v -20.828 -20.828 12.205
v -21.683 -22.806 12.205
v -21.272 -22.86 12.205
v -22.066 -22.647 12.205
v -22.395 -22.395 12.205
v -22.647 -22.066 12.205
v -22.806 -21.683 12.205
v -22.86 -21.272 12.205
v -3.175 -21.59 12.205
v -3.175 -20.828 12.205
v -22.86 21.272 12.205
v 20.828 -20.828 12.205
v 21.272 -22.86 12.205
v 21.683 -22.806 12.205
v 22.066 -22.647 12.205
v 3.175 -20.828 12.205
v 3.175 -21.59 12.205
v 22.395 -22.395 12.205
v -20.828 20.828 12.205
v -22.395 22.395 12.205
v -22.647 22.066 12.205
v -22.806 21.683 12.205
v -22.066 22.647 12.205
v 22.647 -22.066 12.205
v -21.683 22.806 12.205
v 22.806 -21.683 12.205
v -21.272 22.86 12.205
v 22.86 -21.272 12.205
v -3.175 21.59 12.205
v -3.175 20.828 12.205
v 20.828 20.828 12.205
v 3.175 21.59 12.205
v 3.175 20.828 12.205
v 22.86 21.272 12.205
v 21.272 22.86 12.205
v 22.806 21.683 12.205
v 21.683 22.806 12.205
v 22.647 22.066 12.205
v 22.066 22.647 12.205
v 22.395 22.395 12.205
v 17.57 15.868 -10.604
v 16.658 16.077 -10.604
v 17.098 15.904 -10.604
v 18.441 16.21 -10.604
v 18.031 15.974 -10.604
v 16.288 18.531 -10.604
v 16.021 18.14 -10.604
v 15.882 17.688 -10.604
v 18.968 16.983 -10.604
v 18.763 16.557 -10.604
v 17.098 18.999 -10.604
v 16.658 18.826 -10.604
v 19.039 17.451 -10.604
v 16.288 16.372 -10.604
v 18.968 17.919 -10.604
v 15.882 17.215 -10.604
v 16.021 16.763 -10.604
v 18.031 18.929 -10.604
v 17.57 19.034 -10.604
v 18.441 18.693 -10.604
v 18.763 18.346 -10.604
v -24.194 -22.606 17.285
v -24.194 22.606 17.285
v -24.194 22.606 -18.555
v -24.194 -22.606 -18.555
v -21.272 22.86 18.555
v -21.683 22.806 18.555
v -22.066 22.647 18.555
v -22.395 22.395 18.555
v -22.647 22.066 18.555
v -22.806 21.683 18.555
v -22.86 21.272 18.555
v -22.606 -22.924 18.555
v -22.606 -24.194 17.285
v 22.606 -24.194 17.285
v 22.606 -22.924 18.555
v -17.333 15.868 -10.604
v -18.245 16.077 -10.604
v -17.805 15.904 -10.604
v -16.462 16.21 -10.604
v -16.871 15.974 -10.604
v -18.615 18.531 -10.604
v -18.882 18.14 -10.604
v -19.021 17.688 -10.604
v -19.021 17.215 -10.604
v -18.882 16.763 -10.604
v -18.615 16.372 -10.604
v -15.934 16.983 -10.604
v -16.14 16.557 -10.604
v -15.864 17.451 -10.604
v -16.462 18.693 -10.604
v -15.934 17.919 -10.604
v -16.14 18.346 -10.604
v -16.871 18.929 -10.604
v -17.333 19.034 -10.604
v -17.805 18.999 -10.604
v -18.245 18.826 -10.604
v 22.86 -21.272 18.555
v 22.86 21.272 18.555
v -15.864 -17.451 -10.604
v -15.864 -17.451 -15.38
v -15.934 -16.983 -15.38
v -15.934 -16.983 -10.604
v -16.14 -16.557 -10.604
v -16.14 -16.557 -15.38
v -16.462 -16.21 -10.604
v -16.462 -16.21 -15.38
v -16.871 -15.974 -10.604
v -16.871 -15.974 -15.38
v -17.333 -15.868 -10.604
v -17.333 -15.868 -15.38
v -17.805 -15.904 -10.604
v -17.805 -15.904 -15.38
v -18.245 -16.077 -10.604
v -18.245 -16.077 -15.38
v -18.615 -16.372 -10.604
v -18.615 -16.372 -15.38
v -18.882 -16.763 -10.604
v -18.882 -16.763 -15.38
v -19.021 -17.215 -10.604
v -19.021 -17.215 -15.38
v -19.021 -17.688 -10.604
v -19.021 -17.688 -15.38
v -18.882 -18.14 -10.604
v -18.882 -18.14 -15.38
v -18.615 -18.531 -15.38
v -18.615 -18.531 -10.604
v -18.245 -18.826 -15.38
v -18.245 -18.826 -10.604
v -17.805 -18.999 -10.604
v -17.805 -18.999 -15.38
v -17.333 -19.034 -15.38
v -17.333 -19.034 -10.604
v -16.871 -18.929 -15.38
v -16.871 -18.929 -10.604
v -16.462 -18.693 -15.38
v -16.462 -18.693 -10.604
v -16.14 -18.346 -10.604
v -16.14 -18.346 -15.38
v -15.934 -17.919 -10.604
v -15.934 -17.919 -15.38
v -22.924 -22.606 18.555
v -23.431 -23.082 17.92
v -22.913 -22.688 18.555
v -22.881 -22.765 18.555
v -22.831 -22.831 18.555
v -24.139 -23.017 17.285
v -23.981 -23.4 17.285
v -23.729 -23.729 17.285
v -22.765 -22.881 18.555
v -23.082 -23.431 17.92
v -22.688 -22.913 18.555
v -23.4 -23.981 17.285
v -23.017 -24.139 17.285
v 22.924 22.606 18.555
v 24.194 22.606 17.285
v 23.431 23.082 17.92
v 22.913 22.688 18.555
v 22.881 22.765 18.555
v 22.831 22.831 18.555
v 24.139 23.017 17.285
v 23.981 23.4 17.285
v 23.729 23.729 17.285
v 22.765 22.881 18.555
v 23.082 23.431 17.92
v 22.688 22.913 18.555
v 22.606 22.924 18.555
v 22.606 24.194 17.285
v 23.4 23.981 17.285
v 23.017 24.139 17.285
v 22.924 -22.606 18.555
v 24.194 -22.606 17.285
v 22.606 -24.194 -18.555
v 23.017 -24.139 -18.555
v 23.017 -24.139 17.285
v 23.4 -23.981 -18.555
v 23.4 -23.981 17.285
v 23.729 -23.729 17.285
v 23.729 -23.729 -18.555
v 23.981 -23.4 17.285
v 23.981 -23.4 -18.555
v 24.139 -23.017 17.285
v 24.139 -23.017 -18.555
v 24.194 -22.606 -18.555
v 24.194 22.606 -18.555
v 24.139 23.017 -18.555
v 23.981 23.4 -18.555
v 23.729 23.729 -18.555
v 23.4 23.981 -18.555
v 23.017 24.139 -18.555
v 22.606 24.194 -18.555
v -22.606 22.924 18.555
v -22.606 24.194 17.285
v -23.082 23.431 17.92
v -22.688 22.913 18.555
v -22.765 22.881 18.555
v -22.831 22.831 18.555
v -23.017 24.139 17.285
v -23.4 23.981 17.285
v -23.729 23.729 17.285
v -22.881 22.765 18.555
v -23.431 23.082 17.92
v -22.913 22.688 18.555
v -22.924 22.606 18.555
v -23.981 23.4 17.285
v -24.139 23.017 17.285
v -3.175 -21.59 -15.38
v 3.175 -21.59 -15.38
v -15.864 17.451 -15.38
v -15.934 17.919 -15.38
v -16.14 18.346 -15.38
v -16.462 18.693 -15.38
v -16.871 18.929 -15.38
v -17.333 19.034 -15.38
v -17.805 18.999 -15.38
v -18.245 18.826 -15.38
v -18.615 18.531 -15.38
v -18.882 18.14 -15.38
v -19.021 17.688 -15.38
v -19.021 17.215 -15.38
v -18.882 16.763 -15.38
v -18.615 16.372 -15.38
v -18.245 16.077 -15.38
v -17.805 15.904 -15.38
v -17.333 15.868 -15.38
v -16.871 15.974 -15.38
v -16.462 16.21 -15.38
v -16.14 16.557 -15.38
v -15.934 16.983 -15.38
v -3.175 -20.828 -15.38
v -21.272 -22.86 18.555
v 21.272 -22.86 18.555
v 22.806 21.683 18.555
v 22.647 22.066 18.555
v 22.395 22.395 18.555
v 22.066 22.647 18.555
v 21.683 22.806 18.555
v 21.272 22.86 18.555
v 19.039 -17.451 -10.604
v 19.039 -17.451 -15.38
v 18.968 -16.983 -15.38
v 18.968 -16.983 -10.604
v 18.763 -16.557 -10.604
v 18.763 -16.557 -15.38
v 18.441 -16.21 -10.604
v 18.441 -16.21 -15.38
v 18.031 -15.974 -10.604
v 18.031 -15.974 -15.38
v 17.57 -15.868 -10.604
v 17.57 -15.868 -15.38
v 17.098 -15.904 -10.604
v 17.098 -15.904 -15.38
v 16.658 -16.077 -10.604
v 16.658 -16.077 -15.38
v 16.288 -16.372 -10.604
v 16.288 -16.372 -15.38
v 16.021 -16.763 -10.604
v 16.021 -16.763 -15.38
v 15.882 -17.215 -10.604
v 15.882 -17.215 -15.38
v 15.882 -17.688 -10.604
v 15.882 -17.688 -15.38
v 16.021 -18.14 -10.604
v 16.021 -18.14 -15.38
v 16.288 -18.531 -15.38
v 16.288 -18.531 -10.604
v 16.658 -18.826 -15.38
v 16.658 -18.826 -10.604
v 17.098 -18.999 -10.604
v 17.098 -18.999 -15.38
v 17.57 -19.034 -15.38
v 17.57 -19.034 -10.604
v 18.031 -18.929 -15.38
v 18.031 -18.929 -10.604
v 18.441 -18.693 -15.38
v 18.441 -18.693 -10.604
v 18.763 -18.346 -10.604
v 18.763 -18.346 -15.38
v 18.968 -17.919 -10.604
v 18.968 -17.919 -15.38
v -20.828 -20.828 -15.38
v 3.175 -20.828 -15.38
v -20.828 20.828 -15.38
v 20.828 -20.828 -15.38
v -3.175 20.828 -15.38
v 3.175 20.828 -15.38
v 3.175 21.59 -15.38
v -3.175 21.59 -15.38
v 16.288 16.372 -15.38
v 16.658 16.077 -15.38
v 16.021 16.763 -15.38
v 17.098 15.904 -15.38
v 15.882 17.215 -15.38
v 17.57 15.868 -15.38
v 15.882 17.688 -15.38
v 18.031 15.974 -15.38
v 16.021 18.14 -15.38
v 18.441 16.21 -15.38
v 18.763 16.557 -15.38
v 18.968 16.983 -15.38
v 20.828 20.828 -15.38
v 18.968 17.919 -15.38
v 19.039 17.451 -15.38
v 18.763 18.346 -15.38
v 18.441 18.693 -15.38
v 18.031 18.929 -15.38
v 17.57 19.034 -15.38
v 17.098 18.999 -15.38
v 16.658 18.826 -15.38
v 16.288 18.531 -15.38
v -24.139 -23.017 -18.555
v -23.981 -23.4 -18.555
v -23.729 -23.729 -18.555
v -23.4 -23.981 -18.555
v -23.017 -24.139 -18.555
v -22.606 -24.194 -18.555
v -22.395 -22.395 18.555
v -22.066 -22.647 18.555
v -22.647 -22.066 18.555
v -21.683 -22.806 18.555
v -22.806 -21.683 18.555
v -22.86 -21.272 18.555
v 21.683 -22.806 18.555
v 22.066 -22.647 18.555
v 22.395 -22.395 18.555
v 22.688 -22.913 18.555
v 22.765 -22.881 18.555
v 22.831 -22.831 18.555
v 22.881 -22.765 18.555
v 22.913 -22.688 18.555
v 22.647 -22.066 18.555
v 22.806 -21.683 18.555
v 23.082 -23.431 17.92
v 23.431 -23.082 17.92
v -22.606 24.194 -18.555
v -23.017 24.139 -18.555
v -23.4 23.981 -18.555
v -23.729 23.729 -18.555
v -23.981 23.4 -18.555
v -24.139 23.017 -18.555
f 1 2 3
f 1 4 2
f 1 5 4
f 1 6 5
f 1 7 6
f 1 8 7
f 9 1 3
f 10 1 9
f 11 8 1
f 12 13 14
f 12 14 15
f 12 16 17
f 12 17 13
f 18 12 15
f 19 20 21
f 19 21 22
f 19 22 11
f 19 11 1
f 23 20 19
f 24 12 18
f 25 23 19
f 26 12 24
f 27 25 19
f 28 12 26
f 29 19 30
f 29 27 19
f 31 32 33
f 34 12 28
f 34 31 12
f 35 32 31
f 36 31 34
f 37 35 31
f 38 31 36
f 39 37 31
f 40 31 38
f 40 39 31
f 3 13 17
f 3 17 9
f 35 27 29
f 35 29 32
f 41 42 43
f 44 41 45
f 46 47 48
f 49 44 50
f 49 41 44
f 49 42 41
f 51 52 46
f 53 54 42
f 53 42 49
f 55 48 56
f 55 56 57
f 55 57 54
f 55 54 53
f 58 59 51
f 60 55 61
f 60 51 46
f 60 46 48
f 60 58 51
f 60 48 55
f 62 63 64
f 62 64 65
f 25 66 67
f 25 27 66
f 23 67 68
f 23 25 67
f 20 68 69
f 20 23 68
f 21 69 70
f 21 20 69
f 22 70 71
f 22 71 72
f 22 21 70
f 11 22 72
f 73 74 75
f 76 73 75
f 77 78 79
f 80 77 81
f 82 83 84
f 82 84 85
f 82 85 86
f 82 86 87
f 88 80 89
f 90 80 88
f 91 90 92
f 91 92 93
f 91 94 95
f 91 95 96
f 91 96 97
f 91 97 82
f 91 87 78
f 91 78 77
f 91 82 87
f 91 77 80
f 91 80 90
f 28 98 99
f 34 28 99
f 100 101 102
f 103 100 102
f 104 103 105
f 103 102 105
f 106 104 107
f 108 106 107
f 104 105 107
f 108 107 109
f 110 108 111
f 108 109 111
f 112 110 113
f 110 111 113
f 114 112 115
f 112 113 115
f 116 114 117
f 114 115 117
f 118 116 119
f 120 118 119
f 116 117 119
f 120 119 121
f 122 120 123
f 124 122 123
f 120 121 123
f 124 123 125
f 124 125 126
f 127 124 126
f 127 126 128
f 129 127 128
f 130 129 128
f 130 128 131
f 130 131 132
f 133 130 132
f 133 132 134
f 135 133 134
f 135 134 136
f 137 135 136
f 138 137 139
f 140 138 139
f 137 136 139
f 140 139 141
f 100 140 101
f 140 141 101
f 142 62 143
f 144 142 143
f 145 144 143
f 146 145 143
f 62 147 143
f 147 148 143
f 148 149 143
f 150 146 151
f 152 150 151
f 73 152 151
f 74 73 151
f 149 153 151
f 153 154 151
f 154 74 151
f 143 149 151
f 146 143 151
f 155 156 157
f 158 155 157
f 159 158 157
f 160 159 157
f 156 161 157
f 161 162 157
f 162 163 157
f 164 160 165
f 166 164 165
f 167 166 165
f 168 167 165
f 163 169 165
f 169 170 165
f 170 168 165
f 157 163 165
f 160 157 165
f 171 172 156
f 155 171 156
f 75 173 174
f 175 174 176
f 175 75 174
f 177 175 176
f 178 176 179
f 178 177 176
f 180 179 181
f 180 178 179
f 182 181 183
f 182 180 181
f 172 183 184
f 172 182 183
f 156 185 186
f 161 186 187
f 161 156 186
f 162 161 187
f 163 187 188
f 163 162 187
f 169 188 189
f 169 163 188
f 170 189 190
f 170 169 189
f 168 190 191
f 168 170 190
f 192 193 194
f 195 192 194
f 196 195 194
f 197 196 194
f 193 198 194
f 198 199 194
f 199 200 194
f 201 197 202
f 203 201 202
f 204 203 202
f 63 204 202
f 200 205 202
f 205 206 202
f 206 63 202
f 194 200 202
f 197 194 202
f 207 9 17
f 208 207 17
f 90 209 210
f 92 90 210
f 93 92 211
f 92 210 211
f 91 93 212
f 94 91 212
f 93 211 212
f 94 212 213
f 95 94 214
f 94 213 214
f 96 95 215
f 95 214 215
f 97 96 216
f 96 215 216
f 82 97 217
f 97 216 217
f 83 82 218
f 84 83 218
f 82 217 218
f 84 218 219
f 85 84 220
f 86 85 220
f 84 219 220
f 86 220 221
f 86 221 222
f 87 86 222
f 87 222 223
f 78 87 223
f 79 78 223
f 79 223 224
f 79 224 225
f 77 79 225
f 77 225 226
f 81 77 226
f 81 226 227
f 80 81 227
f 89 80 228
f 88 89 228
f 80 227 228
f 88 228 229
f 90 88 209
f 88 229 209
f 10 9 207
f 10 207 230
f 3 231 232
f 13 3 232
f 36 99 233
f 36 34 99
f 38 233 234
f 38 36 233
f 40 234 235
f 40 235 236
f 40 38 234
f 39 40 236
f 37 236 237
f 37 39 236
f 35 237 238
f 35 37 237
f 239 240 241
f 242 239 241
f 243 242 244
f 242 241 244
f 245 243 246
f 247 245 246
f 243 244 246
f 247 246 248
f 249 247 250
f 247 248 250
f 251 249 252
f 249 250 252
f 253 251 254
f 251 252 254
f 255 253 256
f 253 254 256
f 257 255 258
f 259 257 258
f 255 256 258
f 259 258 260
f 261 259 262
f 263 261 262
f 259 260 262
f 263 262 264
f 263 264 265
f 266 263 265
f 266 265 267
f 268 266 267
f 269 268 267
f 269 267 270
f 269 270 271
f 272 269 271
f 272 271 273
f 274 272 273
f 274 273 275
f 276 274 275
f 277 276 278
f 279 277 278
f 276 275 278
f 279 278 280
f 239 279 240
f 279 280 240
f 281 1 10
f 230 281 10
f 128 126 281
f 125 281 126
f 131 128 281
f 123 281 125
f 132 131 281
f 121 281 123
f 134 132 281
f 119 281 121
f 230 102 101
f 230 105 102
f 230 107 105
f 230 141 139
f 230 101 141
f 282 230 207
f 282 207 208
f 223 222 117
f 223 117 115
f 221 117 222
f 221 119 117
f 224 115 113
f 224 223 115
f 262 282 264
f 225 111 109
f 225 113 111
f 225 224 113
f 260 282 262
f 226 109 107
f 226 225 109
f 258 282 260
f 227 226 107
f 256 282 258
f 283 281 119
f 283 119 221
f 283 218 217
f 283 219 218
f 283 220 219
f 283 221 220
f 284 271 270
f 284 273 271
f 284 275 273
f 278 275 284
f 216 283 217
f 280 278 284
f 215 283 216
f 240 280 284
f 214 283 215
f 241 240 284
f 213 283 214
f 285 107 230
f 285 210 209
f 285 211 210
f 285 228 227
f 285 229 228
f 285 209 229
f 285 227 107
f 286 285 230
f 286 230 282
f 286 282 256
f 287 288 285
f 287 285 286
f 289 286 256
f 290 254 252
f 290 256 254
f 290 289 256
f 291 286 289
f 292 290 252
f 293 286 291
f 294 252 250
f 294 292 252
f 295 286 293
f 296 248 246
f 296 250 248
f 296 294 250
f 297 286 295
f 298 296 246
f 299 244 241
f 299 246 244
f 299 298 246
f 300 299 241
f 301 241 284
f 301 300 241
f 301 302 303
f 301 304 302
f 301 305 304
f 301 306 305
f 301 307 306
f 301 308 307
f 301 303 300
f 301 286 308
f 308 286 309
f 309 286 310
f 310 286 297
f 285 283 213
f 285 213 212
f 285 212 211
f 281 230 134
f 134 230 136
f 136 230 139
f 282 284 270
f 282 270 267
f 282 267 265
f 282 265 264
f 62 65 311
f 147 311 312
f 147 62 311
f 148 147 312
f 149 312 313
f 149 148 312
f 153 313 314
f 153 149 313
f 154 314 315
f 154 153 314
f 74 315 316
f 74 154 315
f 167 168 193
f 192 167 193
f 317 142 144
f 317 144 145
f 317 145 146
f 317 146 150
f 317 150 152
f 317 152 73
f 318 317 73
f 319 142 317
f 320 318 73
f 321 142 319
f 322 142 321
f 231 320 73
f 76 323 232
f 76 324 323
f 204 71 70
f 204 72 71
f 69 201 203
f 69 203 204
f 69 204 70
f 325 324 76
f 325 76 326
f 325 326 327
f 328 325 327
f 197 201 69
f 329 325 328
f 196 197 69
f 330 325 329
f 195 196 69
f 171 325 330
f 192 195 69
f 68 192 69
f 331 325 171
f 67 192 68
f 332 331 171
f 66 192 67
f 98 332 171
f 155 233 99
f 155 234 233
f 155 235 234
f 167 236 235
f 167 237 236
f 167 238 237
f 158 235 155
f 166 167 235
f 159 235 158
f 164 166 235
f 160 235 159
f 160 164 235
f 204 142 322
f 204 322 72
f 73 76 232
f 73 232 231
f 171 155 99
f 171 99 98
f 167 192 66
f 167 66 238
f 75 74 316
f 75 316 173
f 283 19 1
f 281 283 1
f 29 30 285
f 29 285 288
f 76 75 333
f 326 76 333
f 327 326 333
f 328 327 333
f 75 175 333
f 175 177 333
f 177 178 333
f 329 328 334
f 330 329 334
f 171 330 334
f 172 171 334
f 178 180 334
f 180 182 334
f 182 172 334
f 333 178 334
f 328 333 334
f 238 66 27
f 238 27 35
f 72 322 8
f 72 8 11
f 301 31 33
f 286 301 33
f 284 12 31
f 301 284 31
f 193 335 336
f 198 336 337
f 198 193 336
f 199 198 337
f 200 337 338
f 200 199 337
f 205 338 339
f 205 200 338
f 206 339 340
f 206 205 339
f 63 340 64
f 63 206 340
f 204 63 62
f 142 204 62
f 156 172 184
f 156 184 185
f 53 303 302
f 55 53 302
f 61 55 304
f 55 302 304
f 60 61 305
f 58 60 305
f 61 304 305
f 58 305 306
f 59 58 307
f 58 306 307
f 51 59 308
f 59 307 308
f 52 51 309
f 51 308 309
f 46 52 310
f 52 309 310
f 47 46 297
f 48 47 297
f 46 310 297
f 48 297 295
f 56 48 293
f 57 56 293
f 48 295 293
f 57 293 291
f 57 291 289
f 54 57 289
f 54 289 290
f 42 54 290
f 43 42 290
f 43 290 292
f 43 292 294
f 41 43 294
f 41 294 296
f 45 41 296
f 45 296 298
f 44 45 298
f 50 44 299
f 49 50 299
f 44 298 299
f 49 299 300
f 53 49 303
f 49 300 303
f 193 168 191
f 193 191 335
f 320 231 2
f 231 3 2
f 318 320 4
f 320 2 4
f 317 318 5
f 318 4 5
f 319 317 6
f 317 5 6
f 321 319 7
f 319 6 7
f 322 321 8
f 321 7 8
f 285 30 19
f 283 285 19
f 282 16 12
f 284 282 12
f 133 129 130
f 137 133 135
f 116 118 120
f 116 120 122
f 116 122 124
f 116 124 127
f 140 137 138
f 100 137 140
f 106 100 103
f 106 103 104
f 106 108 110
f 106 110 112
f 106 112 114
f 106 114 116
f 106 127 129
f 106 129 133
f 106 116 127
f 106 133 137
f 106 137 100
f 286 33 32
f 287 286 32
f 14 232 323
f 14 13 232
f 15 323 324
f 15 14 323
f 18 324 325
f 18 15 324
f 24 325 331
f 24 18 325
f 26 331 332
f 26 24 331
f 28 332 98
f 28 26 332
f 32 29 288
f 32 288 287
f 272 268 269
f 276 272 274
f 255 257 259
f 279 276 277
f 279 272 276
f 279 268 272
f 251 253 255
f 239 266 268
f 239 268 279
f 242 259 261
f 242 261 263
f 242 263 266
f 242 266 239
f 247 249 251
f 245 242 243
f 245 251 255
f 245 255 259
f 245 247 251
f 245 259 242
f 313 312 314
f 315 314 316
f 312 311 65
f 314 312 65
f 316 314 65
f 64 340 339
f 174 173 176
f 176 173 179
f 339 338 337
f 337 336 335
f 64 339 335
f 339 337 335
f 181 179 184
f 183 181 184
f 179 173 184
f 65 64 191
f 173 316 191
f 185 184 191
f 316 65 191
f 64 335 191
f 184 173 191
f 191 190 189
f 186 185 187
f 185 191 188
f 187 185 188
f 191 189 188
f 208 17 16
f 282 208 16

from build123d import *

# Parameters (mm, degrees)
F1_DEPTH  = 18.5547
F3_DEPTH  = 33.9344
F4_W      = 45.72
F4_H      = 45.72
F5_DEPTH  = 6.35
F6_R      = 1.5875
F7_DEPTH  = 4.7752
F8_R      = 1.5875
F9_W      = 6.35
F9_H      = 0.762
F10_DEPTH = 27.5844
F11_SIZE  = 1.27


with BuildPart() as f1:
    # F0 (on Top) → F1 (new body, symmetric)
    with BuildSketch(Plane.XY):
        with BuildLine():
            ThreePointArc((24.1935, 22.606), (23.7285320151, 23.7285320151), (22.606, 24.1935))
            Line((22.606, 24.1935), (-22.606, 24.1935))
            ThreePointArc((-22.606, 24.1935), (-23.7285320151, 23.7285320151), (-24.1935, 22.606))
            Line((-24.1935, 22.606), (-24.1935, -22.606))
            ThreePointArc((-24.1935, -22.606), (-23.7285320151, -23.7285320151), (-22.606, -24.1935))
            Line((-22.606, -24.1935), (22.606, -24.1935))
            ThreePointArc((22.606, -24.1935), (23.7285320151, -23.7285320151), (24.1935, -22.606))
            Line((24.1935, -22.606), (24.1935, 22.606))
        make_face()
    extrude(amount=F1_DEPTH, both=True)

    # F2 (on face) → F3 (cut)
    with BuildSketch(Plane.XY.offset(18.5547)):
        Polygon((20.828, -20.3835), (20.828, 20.3835), (20.828, 20.828), (20.3835, 20.828), (-20.3835, 20.828), (-20.828, 20.828), (-20.828, 20.3835), (-20.828, -20.3835), (-20.828, -20.828), (-20.3835, -20.828), (20.3835, -20.828), (20.828, -20.828), align=None)
    extrude(amount=-F3_DEPTH, mode=Mode.SUBTRACT)

    # F4 (on face) → F5 (cut)
    with BuildSketch(Plane.XY.offset(18.5547)):
        Rectangle(F4_W, F4_H)
    extrude(amount=-F5_DEPTH, mode=Mode.SUBTRACT)

    # F6 (on face) → F7 (join)
    with BuildSketch(Plane.XY.offset(-15.3797)):
        with Locations((17.4514236985, -17.4514236985)):
            Circle(F6_R)
        with Locations((-17.4514236985, -17.4514236985)):
            Circle(F6_R)
        with Locations((-17.4514236985, 17.4514236985)):
            Circle(F6_R)
        with Locations((17.4514236985, 17.4514236985)):
            Circle(F6_R)
    extrude(amount=F7_DEPTH)

    # F8
    f8_edges = [f1.edges().sort_by_distance(p)[0] for p in [
        (22.86, 22.86, 15.3797),
        (-22.86, 22.86, 15.3797),
        (-22.86, -22.86, 15.3797),
        (22.86, -22.86, 15.3797),
    ]]
    fillet(f8_edges, radius=F8_R)

    # F9 (on face) → F10 (cut, through all)
    with BuildSketch(Plane.XY.offset(12.2047)):
        with Locations((0, 21.209)):
            Rectangle(F9_W, F9_H)
        with Locations((0, -21.209)):
            Rectangle(F9_W, F9_H)
    extrude(amount=-F10_DEPTH, mode=Mode.SUBTRACT)

    # F11
    f11_edges = [f1.edges().sort_by_distance(p)[0] for p in [
        (-23.728532, 23.728532, 18.5547),
        (-24.1935, 0, 18.5547),
        (-23.728532, -23.728532, 18.5547),
        (0, -24.1935, 18.5547),
        (23.728532, -23.728532, 18.5547),
        (24.1935, 0, 18.5547),
        (0, 24.1935, 18.5547),
    ]]
    chamfer(f11_edges, length=F11_SIZE)


solid = f1.part
